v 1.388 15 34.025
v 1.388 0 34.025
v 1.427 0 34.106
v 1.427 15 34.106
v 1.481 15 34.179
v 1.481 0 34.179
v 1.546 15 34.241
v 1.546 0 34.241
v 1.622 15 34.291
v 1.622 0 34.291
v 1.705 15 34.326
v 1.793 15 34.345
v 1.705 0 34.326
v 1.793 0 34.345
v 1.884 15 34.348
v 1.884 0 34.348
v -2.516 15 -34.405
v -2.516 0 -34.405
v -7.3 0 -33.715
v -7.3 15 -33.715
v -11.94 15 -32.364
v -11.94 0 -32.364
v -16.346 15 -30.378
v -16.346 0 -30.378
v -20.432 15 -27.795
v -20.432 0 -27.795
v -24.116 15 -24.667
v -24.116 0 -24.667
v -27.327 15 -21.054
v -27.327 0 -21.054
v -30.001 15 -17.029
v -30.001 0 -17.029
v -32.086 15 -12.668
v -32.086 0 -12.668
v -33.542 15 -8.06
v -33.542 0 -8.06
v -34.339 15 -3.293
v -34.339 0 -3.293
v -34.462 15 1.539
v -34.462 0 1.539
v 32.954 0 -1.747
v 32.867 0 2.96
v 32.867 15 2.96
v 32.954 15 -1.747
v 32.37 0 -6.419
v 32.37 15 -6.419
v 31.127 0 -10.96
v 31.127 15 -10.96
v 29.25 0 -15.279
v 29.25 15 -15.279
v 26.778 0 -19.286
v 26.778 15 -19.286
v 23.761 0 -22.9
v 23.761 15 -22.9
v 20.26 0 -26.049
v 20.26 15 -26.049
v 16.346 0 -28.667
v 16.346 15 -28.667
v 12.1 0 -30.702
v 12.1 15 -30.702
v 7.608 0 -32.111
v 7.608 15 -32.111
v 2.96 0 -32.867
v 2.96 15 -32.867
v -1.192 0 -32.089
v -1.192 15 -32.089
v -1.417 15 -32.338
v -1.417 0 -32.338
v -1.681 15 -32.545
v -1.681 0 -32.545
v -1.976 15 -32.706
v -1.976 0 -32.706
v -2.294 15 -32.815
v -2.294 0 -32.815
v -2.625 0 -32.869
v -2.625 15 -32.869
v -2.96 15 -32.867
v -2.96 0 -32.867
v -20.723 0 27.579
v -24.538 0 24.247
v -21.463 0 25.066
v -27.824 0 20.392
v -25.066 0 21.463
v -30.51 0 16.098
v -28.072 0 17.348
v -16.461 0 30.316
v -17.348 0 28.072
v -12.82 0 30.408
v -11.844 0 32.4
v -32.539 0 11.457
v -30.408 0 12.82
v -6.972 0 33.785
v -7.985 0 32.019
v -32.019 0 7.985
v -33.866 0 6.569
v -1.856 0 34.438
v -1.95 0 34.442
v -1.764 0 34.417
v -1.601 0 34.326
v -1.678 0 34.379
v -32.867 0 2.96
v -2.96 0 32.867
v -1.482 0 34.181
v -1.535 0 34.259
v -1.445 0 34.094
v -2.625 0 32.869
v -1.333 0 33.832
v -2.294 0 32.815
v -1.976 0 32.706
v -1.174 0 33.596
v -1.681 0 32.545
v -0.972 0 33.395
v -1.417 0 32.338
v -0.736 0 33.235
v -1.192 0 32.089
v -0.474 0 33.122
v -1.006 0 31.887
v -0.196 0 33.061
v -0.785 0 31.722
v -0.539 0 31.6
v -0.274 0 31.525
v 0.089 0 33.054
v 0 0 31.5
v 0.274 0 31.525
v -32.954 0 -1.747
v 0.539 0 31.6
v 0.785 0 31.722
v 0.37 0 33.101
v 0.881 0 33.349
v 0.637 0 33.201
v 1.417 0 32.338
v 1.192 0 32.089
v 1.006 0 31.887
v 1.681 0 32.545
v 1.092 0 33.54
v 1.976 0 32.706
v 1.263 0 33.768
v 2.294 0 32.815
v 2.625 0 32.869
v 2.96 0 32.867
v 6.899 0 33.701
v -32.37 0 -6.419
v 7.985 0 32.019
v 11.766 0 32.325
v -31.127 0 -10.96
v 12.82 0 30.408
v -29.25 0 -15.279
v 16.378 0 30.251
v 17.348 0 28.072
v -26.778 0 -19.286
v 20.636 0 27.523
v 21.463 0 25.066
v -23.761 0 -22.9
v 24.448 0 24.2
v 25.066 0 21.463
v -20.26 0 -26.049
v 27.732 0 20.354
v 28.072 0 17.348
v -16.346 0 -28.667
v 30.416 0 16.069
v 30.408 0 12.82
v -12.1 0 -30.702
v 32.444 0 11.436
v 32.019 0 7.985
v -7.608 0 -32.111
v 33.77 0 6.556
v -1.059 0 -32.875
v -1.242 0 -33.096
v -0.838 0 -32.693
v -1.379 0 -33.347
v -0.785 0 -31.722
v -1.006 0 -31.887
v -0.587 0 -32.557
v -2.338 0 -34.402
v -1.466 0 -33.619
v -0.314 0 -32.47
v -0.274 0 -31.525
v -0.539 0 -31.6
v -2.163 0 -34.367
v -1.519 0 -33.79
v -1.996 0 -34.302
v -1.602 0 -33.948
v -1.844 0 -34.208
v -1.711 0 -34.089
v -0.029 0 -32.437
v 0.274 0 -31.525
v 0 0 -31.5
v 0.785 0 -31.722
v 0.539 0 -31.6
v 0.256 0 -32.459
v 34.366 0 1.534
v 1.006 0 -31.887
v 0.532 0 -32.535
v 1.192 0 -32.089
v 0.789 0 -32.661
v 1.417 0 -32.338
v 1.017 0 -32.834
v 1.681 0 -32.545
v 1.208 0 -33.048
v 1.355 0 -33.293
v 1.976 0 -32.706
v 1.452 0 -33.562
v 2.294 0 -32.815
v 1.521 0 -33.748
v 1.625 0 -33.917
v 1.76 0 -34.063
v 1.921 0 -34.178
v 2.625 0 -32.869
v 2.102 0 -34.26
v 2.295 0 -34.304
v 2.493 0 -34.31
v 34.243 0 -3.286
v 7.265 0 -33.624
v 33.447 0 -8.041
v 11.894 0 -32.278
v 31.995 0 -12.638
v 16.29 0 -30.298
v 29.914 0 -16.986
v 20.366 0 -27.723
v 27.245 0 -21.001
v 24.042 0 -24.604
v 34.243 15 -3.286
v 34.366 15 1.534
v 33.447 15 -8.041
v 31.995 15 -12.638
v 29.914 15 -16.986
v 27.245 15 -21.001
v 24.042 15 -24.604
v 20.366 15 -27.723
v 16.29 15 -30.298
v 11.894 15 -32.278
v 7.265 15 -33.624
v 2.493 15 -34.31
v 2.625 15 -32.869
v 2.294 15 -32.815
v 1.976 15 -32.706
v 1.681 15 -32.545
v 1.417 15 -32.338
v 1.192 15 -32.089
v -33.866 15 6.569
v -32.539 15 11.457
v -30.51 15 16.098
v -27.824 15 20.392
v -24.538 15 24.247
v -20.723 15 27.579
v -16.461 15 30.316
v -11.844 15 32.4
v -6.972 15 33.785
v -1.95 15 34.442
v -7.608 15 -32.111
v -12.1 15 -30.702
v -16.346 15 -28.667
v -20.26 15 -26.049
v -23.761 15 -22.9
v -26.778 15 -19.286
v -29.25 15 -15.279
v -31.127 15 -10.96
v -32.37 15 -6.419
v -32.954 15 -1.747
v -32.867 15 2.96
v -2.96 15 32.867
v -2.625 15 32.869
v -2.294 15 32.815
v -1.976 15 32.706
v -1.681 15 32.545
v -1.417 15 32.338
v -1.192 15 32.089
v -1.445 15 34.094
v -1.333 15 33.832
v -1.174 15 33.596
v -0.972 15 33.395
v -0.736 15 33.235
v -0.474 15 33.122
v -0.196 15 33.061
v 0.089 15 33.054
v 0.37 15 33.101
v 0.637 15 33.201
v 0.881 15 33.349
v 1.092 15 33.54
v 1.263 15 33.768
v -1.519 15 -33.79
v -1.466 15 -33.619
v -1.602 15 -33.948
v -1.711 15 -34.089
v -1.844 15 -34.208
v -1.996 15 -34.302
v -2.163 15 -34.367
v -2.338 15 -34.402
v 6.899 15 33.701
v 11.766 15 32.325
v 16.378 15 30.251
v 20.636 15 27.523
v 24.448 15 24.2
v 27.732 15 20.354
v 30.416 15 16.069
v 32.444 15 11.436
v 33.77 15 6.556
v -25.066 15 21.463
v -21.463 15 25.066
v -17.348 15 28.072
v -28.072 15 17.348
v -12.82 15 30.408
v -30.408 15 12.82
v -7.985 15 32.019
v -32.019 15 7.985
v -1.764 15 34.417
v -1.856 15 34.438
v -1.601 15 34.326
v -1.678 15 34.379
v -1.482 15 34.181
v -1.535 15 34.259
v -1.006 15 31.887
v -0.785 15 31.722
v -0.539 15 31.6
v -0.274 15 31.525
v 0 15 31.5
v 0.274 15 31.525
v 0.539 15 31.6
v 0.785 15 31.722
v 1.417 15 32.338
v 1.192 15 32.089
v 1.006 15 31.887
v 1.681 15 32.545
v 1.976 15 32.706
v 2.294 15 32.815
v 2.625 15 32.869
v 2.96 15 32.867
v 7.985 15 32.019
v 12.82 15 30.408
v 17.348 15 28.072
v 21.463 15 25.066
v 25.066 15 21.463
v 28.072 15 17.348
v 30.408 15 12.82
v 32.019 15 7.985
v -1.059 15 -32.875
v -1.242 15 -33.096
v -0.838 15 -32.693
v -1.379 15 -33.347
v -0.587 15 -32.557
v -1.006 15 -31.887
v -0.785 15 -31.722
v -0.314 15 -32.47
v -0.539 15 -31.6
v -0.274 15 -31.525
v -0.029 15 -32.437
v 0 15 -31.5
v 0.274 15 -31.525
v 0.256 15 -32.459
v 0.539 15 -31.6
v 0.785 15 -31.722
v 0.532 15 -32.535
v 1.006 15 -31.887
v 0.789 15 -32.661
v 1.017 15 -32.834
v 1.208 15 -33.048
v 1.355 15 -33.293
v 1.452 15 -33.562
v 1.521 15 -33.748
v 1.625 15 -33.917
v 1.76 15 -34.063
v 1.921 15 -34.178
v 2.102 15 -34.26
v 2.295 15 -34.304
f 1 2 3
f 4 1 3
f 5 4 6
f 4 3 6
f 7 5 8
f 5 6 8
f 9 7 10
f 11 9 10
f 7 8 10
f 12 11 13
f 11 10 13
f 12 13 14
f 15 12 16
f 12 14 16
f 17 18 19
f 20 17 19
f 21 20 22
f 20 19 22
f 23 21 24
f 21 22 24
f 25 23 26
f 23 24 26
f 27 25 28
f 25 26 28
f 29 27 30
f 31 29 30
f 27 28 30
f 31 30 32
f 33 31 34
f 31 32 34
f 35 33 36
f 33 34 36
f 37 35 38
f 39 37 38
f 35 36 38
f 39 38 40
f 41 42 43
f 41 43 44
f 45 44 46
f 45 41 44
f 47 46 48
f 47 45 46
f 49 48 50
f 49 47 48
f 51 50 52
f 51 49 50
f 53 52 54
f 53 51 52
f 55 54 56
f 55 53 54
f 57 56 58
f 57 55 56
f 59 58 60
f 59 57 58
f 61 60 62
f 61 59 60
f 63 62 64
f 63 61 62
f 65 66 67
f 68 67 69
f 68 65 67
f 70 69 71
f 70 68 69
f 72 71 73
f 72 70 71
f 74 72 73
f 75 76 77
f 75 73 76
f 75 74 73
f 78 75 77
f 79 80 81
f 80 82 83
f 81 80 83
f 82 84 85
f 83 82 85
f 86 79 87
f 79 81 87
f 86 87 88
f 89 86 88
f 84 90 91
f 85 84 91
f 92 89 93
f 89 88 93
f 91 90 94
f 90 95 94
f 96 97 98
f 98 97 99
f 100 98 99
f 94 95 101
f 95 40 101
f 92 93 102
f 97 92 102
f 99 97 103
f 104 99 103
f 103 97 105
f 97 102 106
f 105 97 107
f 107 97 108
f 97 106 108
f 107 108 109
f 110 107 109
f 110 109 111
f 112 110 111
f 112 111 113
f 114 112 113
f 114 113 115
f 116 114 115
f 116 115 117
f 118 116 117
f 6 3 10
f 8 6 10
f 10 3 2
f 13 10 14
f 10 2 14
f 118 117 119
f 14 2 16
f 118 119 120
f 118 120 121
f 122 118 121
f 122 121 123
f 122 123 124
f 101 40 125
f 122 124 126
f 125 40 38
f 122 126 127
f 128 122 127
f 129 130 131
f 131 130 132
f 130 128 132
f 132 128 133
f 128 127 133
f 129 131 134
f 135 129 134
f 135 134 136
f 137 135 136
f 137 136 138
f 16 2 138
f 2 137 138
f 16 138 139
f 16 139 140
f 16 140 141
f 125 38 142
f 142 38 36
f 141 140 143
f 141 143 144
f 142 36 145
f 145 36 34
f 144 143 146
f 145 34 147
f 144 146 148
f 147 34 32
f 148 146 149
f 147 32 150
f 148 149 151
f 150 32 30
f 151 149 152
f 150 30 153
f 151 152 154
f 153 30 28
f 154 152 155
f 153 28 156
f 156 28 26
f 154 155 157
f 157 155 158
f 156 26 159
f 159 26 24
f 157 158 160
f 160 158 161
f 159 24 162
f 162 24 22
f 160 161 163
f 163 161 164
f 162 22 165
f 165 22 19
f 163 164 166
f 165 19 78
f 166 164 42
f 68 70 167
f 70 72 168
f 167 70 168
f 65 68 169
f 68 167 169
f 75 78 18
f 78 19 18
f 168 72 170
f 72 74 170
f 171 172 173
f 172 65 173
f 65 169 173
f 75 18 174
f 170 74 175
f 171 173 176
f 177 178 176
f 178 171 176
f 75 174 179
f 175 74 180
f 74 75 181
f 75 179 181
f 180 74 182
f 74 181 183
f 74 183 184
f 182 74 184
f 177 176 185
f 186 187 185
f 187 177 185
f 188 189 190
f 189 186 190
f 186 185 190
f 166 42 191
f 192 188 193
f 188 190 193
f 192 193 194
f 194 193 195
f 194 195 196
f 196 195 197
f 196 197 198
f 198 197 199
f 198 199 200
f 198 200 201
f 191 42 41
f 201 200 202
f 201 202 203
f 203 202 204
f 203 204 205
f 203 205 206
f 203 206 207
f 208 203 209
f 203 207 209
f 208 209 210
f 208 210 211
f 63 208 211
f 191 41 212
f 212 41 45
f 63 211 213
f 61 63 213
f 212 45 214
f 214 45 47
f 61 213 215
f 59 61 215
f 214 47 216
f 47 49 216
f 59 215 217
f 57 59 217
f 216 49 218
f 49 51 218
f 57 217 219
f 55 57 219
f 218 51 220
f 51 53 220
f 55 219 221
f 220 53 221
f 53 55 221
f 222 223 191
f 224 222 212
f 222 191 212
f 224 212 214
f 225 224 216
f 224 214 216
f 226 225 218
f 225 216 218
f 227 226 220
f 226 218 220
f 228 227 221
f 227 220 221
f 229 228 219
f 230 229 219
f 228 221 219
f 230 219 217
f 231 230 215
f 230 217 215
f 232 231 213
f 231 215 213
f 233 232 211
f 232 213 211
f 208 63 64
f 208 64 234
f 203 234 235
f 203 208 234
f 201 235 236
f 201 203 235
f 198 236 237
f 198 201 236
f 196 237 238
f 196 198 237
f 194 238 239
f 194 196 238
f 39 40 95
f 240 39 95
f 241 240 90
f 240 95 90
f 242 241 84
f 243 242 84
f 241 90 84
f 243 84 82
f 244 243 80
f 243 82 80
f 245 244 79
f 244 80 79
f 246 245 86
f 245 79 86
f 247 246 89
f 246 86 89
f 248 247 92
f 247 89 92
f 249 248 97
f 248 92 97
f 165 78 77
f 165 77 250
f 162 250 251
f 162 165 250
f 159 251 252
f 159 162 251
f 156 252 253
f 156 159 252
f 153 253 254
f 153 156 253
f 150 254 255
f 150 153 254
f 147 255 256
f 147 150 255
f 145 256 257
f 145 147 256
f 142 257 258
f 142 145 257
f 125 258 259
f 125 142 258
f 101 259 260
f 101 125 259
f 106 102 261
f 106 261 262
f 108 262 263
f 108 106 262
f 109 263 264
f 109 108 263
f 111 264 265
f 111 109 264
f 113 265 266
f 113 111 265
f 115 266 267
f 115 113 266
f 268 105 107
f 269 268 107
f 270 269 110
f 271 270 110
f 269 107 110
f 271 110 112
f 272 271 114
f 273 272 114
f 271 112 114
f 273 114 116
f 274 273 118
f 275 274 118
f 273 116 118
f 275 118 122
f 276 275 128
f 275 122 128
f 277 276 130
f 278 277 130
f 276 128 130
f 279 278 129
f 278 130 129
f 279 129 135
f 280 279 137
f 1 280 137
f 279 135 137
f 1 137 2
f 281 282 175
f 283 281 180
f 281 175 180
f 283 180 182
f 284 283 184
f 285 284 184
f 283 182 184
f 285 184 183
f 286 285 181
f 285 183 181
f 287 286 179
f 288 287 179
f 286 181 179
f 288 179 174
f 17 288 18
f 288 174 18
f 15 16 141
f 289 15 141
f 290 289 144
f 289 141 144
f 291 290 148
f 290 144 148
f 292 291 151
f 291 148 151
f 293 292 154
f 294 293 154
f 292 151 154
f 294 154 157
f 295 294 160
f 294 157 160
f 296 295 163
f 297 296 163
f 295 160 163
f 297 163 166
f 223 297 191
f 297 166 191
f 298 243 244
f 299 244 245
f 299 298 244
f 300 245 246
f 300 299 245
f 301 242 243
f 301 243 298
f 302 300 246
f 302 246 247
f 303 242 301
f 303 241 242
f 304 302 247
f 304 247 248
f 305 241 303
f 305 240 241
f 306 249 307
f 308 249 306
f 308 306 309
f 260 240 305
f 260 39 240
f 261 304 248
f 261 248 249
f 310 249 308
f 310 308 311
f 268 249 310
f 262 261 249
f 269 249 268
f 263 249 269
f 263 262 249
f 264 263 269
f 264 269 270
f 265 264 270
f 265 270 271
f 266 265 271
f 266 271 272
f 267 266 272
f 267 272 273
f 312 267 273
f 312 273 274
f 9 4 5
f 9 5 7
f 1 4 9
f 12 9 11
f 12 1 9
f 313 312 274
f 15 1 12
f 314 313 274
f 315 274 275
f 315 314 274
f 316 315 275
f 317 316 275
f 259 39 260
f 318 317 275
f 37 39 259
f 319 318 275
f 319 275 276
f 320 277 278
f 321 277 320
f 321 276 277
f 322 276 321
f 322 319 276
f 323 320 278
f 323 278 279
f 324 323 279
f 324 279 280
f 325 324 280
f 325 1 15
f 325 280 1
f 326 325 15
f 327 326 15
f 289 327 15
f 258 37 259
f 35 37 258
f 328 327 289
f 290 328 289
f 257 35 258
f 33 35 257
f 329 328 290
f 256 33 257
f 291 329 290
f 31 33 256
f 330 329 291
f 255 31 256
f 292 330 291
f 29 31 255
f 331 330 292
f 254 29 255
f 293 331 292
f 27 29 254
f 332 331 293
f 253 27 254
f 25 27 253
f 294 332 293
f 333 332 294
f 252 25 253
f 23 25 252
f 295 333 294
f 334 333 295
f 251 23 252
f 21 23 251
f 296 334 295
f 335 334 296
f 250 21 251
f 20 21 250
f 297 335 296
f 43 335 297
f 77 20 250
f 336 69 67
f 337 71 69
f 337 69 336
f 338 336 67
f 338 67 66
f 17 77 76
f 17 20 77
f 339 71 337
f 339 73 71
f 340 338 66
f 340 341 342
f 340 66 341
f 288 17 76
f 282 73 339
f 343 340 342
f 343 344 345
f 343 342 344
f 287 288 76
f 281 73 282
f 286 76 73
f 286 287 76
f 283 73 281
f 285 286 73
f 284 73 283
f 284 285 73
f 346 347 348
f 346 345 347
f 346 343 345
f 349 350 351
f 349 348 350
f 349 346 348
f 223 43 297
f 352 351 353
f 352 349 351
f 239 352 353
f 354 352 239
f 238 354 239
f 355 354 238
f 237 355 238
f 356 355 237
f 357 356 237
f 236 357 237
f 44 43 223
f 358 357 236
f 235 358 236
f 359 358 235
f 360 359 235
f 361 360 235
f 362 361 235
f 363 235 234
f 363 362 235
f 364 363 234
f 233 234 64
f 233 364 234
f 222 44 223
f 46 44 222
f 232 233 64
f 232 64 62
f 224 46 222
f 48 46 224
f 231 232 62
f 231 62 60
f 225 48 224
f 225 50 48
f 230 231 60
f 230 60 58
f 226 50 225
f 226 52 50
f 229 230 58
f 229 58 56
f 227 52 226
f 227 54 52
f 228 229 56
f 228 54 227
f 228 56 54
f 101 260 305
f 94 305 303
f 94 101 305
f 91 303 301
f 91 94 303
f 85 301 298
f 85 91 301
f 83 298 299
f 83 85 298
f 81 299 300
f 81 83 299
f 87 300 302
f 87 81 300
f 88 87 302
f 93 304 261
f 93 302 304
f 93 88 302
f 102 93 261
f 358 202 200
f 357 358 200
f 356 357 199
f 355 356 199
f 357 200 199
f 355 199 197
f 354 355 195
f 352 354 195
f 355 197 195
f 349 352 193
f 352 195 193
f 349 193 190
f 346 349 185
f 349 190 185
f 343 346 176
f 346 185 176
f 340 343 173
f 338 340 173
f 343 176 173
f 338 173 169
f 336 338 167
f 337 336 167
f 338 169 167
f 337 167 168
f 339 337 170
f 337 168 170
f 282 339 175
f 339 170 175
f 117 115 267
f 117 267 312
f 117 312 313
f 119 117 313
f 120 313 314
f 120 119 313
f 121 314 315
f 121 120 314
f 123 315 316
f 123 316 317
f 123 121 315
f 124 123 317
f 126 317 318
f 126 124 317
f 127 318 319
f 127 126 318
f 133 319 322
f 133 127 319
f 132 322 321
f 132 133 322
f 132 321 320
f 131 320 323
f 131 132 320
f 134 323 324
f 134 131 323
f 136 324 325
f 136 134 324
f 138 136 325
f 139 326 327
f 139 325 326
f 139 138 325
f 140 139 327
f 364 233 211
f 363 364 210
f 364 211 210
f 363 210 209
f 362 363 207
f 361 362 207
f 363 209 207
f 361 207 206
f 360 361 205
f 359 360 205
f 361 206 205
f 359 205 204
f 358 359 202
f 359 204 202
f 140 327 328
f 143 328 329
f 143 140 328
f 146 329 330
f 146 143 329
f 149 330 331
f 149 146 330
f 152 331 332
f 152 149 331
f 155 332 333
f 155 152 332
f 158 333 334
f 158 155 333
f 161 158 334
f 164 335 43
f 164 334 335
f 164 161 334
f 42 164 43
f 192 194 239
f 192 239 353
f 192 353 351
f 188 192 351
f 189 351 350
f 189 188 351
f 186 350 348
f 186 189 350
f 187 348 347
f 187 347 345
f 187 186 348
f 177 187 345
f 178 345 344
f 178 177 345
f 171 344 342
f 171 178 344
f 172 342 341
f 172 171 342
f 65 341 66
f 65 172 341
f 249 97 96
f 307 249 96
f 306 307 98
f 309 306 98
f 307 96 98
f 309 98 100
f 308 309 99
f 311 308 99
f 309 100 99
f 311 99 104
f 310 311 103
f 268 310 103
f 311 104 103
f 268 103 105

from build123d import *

# Parameters (mm, degrees)
BOSS_EXTRUDE1_DEPTH = 15
CUT_EXTRUDE2_DEPTH  = 52.002935676


with BuildPart() as part:
    # Sketch1 → Boss-Extrude1 (new body)
    with BuildSketch(Plane(origin=(0, 0, 0), x_dir=(1, 0, 0), z_dir=(0, 1, 0))):
        with BuildLine():
            ThreePointArc((1.388184439, -34.024526654), (1.582903075, -34.267692689), (1.883792339, -34.348381715))
            ThreePointArc((1.883792339, -34.348381715), (24.448065102, -24.200250262), (34.365790759, -1.53376189))
            ThreePointArc((34.365790759, -1.53376189), (25.706615752, 22.858913066), (2.493104989, 34.309538433))
            ThreePointArc((2.493104989, 34.309538433), (1.837317334, 34.124415112), (1.452378604, 33.562142698))
            ThreePointArc((1.452378604, 33.562142698), (-0.029391592, 32.437392534), (-1.46595483, 33.619336656))
            ThreePointArc((-1.46595483, 33.619336656), (-1.844328043, 34.20829277), (-2.516198277, 34.404827707))
            ThreePointArc((-2.516198277, 34.404827707), (-25.784489967, 22.916882433), (-34.462378171, -1.538802818))
            ThreePointArc((-34.462378171, -1.538802818), (-24.537991164, -24.246863982), (-1.949992086, -34.441558533))
            ThreePointArc((-1.949992086, -34.441558533), (-1.638342507, -34.354295246), (-1.445420769, -34.094446164))
            ThreePointArc((-1.445420769, -34.094446164), (-0.053498551, -33.05116711), (1.388184439, -34.024526654))
        make_face()
        with BuildLine():
            Line((-2.417, 3.18717916), (0, 3.18717916))
            Line((0, 3.18717916), (2.417, 3.18717916))
            ThreePointArc((2.417, 3.18717916), (0, -4), (-2.417, 3.18717916))
        make_face(mode=Mode.SUBTRACT)
    extrude(amount=BOSS_EXTRUDE1_DEPTH)

    # Sketch2 → Cut-Extrude2 (cut, through all)
    with BuildSketch(Plane(origin=(0, 0, 0), x_dir=(1, 0, 0), z_dir=(0, 1, 0))):
        with BuildLine():
            ThreePointArc((-32.866935484, -2.96049859), (-23.334523779, -23.334523779), (-2.96049859, -32.866935484))
            ThreePointArc((-2.96049859, -32.866935484), (-1.9760642, -32.705835472), (-1.191889043, -32.089285714))
            ThreePointArc((-1.191889043, -32.089285714), (0, -31.5), (1.191889043, -32.089285714))
            ThreePointArc((1.191889043, -32.089285714), (1.9760642, -32.705835472), (2.96049859, -32.866935484))
            ThreePointArc((2.96049859, -32.866935484), (23.334523779, -23.334523779), (32.866935484, -2.96049859))
            ThreePointArc((32.866935484, -2.96049859), (25.333821586, 21.147044329), (2.96049859, 32.866935484))
            ThreePointArc((2.96049859, 32.866935484), (1.9760642, 32.705835472), (1.191889043, 32.089285714))
            ThreePointArc((1.191889043, 32.089285714), (0, 31.5), (-1.191889043, 32.089285714))
            ThreePointArc((-1.191889043, 32.089285714), (-1.9760642, 32.705835472), (-2.96049859, 32.866935484))
            ThreePointArc((-2.96049859, 32.866935484), (-25.333821586, 21.147044329), (-32.866935484, -2.96049859))
        make_face()
    extrude(amount=CUT_EXTRUDE2_DEPTH, mode=Mode.SUBTRACT)


solid = part.part
